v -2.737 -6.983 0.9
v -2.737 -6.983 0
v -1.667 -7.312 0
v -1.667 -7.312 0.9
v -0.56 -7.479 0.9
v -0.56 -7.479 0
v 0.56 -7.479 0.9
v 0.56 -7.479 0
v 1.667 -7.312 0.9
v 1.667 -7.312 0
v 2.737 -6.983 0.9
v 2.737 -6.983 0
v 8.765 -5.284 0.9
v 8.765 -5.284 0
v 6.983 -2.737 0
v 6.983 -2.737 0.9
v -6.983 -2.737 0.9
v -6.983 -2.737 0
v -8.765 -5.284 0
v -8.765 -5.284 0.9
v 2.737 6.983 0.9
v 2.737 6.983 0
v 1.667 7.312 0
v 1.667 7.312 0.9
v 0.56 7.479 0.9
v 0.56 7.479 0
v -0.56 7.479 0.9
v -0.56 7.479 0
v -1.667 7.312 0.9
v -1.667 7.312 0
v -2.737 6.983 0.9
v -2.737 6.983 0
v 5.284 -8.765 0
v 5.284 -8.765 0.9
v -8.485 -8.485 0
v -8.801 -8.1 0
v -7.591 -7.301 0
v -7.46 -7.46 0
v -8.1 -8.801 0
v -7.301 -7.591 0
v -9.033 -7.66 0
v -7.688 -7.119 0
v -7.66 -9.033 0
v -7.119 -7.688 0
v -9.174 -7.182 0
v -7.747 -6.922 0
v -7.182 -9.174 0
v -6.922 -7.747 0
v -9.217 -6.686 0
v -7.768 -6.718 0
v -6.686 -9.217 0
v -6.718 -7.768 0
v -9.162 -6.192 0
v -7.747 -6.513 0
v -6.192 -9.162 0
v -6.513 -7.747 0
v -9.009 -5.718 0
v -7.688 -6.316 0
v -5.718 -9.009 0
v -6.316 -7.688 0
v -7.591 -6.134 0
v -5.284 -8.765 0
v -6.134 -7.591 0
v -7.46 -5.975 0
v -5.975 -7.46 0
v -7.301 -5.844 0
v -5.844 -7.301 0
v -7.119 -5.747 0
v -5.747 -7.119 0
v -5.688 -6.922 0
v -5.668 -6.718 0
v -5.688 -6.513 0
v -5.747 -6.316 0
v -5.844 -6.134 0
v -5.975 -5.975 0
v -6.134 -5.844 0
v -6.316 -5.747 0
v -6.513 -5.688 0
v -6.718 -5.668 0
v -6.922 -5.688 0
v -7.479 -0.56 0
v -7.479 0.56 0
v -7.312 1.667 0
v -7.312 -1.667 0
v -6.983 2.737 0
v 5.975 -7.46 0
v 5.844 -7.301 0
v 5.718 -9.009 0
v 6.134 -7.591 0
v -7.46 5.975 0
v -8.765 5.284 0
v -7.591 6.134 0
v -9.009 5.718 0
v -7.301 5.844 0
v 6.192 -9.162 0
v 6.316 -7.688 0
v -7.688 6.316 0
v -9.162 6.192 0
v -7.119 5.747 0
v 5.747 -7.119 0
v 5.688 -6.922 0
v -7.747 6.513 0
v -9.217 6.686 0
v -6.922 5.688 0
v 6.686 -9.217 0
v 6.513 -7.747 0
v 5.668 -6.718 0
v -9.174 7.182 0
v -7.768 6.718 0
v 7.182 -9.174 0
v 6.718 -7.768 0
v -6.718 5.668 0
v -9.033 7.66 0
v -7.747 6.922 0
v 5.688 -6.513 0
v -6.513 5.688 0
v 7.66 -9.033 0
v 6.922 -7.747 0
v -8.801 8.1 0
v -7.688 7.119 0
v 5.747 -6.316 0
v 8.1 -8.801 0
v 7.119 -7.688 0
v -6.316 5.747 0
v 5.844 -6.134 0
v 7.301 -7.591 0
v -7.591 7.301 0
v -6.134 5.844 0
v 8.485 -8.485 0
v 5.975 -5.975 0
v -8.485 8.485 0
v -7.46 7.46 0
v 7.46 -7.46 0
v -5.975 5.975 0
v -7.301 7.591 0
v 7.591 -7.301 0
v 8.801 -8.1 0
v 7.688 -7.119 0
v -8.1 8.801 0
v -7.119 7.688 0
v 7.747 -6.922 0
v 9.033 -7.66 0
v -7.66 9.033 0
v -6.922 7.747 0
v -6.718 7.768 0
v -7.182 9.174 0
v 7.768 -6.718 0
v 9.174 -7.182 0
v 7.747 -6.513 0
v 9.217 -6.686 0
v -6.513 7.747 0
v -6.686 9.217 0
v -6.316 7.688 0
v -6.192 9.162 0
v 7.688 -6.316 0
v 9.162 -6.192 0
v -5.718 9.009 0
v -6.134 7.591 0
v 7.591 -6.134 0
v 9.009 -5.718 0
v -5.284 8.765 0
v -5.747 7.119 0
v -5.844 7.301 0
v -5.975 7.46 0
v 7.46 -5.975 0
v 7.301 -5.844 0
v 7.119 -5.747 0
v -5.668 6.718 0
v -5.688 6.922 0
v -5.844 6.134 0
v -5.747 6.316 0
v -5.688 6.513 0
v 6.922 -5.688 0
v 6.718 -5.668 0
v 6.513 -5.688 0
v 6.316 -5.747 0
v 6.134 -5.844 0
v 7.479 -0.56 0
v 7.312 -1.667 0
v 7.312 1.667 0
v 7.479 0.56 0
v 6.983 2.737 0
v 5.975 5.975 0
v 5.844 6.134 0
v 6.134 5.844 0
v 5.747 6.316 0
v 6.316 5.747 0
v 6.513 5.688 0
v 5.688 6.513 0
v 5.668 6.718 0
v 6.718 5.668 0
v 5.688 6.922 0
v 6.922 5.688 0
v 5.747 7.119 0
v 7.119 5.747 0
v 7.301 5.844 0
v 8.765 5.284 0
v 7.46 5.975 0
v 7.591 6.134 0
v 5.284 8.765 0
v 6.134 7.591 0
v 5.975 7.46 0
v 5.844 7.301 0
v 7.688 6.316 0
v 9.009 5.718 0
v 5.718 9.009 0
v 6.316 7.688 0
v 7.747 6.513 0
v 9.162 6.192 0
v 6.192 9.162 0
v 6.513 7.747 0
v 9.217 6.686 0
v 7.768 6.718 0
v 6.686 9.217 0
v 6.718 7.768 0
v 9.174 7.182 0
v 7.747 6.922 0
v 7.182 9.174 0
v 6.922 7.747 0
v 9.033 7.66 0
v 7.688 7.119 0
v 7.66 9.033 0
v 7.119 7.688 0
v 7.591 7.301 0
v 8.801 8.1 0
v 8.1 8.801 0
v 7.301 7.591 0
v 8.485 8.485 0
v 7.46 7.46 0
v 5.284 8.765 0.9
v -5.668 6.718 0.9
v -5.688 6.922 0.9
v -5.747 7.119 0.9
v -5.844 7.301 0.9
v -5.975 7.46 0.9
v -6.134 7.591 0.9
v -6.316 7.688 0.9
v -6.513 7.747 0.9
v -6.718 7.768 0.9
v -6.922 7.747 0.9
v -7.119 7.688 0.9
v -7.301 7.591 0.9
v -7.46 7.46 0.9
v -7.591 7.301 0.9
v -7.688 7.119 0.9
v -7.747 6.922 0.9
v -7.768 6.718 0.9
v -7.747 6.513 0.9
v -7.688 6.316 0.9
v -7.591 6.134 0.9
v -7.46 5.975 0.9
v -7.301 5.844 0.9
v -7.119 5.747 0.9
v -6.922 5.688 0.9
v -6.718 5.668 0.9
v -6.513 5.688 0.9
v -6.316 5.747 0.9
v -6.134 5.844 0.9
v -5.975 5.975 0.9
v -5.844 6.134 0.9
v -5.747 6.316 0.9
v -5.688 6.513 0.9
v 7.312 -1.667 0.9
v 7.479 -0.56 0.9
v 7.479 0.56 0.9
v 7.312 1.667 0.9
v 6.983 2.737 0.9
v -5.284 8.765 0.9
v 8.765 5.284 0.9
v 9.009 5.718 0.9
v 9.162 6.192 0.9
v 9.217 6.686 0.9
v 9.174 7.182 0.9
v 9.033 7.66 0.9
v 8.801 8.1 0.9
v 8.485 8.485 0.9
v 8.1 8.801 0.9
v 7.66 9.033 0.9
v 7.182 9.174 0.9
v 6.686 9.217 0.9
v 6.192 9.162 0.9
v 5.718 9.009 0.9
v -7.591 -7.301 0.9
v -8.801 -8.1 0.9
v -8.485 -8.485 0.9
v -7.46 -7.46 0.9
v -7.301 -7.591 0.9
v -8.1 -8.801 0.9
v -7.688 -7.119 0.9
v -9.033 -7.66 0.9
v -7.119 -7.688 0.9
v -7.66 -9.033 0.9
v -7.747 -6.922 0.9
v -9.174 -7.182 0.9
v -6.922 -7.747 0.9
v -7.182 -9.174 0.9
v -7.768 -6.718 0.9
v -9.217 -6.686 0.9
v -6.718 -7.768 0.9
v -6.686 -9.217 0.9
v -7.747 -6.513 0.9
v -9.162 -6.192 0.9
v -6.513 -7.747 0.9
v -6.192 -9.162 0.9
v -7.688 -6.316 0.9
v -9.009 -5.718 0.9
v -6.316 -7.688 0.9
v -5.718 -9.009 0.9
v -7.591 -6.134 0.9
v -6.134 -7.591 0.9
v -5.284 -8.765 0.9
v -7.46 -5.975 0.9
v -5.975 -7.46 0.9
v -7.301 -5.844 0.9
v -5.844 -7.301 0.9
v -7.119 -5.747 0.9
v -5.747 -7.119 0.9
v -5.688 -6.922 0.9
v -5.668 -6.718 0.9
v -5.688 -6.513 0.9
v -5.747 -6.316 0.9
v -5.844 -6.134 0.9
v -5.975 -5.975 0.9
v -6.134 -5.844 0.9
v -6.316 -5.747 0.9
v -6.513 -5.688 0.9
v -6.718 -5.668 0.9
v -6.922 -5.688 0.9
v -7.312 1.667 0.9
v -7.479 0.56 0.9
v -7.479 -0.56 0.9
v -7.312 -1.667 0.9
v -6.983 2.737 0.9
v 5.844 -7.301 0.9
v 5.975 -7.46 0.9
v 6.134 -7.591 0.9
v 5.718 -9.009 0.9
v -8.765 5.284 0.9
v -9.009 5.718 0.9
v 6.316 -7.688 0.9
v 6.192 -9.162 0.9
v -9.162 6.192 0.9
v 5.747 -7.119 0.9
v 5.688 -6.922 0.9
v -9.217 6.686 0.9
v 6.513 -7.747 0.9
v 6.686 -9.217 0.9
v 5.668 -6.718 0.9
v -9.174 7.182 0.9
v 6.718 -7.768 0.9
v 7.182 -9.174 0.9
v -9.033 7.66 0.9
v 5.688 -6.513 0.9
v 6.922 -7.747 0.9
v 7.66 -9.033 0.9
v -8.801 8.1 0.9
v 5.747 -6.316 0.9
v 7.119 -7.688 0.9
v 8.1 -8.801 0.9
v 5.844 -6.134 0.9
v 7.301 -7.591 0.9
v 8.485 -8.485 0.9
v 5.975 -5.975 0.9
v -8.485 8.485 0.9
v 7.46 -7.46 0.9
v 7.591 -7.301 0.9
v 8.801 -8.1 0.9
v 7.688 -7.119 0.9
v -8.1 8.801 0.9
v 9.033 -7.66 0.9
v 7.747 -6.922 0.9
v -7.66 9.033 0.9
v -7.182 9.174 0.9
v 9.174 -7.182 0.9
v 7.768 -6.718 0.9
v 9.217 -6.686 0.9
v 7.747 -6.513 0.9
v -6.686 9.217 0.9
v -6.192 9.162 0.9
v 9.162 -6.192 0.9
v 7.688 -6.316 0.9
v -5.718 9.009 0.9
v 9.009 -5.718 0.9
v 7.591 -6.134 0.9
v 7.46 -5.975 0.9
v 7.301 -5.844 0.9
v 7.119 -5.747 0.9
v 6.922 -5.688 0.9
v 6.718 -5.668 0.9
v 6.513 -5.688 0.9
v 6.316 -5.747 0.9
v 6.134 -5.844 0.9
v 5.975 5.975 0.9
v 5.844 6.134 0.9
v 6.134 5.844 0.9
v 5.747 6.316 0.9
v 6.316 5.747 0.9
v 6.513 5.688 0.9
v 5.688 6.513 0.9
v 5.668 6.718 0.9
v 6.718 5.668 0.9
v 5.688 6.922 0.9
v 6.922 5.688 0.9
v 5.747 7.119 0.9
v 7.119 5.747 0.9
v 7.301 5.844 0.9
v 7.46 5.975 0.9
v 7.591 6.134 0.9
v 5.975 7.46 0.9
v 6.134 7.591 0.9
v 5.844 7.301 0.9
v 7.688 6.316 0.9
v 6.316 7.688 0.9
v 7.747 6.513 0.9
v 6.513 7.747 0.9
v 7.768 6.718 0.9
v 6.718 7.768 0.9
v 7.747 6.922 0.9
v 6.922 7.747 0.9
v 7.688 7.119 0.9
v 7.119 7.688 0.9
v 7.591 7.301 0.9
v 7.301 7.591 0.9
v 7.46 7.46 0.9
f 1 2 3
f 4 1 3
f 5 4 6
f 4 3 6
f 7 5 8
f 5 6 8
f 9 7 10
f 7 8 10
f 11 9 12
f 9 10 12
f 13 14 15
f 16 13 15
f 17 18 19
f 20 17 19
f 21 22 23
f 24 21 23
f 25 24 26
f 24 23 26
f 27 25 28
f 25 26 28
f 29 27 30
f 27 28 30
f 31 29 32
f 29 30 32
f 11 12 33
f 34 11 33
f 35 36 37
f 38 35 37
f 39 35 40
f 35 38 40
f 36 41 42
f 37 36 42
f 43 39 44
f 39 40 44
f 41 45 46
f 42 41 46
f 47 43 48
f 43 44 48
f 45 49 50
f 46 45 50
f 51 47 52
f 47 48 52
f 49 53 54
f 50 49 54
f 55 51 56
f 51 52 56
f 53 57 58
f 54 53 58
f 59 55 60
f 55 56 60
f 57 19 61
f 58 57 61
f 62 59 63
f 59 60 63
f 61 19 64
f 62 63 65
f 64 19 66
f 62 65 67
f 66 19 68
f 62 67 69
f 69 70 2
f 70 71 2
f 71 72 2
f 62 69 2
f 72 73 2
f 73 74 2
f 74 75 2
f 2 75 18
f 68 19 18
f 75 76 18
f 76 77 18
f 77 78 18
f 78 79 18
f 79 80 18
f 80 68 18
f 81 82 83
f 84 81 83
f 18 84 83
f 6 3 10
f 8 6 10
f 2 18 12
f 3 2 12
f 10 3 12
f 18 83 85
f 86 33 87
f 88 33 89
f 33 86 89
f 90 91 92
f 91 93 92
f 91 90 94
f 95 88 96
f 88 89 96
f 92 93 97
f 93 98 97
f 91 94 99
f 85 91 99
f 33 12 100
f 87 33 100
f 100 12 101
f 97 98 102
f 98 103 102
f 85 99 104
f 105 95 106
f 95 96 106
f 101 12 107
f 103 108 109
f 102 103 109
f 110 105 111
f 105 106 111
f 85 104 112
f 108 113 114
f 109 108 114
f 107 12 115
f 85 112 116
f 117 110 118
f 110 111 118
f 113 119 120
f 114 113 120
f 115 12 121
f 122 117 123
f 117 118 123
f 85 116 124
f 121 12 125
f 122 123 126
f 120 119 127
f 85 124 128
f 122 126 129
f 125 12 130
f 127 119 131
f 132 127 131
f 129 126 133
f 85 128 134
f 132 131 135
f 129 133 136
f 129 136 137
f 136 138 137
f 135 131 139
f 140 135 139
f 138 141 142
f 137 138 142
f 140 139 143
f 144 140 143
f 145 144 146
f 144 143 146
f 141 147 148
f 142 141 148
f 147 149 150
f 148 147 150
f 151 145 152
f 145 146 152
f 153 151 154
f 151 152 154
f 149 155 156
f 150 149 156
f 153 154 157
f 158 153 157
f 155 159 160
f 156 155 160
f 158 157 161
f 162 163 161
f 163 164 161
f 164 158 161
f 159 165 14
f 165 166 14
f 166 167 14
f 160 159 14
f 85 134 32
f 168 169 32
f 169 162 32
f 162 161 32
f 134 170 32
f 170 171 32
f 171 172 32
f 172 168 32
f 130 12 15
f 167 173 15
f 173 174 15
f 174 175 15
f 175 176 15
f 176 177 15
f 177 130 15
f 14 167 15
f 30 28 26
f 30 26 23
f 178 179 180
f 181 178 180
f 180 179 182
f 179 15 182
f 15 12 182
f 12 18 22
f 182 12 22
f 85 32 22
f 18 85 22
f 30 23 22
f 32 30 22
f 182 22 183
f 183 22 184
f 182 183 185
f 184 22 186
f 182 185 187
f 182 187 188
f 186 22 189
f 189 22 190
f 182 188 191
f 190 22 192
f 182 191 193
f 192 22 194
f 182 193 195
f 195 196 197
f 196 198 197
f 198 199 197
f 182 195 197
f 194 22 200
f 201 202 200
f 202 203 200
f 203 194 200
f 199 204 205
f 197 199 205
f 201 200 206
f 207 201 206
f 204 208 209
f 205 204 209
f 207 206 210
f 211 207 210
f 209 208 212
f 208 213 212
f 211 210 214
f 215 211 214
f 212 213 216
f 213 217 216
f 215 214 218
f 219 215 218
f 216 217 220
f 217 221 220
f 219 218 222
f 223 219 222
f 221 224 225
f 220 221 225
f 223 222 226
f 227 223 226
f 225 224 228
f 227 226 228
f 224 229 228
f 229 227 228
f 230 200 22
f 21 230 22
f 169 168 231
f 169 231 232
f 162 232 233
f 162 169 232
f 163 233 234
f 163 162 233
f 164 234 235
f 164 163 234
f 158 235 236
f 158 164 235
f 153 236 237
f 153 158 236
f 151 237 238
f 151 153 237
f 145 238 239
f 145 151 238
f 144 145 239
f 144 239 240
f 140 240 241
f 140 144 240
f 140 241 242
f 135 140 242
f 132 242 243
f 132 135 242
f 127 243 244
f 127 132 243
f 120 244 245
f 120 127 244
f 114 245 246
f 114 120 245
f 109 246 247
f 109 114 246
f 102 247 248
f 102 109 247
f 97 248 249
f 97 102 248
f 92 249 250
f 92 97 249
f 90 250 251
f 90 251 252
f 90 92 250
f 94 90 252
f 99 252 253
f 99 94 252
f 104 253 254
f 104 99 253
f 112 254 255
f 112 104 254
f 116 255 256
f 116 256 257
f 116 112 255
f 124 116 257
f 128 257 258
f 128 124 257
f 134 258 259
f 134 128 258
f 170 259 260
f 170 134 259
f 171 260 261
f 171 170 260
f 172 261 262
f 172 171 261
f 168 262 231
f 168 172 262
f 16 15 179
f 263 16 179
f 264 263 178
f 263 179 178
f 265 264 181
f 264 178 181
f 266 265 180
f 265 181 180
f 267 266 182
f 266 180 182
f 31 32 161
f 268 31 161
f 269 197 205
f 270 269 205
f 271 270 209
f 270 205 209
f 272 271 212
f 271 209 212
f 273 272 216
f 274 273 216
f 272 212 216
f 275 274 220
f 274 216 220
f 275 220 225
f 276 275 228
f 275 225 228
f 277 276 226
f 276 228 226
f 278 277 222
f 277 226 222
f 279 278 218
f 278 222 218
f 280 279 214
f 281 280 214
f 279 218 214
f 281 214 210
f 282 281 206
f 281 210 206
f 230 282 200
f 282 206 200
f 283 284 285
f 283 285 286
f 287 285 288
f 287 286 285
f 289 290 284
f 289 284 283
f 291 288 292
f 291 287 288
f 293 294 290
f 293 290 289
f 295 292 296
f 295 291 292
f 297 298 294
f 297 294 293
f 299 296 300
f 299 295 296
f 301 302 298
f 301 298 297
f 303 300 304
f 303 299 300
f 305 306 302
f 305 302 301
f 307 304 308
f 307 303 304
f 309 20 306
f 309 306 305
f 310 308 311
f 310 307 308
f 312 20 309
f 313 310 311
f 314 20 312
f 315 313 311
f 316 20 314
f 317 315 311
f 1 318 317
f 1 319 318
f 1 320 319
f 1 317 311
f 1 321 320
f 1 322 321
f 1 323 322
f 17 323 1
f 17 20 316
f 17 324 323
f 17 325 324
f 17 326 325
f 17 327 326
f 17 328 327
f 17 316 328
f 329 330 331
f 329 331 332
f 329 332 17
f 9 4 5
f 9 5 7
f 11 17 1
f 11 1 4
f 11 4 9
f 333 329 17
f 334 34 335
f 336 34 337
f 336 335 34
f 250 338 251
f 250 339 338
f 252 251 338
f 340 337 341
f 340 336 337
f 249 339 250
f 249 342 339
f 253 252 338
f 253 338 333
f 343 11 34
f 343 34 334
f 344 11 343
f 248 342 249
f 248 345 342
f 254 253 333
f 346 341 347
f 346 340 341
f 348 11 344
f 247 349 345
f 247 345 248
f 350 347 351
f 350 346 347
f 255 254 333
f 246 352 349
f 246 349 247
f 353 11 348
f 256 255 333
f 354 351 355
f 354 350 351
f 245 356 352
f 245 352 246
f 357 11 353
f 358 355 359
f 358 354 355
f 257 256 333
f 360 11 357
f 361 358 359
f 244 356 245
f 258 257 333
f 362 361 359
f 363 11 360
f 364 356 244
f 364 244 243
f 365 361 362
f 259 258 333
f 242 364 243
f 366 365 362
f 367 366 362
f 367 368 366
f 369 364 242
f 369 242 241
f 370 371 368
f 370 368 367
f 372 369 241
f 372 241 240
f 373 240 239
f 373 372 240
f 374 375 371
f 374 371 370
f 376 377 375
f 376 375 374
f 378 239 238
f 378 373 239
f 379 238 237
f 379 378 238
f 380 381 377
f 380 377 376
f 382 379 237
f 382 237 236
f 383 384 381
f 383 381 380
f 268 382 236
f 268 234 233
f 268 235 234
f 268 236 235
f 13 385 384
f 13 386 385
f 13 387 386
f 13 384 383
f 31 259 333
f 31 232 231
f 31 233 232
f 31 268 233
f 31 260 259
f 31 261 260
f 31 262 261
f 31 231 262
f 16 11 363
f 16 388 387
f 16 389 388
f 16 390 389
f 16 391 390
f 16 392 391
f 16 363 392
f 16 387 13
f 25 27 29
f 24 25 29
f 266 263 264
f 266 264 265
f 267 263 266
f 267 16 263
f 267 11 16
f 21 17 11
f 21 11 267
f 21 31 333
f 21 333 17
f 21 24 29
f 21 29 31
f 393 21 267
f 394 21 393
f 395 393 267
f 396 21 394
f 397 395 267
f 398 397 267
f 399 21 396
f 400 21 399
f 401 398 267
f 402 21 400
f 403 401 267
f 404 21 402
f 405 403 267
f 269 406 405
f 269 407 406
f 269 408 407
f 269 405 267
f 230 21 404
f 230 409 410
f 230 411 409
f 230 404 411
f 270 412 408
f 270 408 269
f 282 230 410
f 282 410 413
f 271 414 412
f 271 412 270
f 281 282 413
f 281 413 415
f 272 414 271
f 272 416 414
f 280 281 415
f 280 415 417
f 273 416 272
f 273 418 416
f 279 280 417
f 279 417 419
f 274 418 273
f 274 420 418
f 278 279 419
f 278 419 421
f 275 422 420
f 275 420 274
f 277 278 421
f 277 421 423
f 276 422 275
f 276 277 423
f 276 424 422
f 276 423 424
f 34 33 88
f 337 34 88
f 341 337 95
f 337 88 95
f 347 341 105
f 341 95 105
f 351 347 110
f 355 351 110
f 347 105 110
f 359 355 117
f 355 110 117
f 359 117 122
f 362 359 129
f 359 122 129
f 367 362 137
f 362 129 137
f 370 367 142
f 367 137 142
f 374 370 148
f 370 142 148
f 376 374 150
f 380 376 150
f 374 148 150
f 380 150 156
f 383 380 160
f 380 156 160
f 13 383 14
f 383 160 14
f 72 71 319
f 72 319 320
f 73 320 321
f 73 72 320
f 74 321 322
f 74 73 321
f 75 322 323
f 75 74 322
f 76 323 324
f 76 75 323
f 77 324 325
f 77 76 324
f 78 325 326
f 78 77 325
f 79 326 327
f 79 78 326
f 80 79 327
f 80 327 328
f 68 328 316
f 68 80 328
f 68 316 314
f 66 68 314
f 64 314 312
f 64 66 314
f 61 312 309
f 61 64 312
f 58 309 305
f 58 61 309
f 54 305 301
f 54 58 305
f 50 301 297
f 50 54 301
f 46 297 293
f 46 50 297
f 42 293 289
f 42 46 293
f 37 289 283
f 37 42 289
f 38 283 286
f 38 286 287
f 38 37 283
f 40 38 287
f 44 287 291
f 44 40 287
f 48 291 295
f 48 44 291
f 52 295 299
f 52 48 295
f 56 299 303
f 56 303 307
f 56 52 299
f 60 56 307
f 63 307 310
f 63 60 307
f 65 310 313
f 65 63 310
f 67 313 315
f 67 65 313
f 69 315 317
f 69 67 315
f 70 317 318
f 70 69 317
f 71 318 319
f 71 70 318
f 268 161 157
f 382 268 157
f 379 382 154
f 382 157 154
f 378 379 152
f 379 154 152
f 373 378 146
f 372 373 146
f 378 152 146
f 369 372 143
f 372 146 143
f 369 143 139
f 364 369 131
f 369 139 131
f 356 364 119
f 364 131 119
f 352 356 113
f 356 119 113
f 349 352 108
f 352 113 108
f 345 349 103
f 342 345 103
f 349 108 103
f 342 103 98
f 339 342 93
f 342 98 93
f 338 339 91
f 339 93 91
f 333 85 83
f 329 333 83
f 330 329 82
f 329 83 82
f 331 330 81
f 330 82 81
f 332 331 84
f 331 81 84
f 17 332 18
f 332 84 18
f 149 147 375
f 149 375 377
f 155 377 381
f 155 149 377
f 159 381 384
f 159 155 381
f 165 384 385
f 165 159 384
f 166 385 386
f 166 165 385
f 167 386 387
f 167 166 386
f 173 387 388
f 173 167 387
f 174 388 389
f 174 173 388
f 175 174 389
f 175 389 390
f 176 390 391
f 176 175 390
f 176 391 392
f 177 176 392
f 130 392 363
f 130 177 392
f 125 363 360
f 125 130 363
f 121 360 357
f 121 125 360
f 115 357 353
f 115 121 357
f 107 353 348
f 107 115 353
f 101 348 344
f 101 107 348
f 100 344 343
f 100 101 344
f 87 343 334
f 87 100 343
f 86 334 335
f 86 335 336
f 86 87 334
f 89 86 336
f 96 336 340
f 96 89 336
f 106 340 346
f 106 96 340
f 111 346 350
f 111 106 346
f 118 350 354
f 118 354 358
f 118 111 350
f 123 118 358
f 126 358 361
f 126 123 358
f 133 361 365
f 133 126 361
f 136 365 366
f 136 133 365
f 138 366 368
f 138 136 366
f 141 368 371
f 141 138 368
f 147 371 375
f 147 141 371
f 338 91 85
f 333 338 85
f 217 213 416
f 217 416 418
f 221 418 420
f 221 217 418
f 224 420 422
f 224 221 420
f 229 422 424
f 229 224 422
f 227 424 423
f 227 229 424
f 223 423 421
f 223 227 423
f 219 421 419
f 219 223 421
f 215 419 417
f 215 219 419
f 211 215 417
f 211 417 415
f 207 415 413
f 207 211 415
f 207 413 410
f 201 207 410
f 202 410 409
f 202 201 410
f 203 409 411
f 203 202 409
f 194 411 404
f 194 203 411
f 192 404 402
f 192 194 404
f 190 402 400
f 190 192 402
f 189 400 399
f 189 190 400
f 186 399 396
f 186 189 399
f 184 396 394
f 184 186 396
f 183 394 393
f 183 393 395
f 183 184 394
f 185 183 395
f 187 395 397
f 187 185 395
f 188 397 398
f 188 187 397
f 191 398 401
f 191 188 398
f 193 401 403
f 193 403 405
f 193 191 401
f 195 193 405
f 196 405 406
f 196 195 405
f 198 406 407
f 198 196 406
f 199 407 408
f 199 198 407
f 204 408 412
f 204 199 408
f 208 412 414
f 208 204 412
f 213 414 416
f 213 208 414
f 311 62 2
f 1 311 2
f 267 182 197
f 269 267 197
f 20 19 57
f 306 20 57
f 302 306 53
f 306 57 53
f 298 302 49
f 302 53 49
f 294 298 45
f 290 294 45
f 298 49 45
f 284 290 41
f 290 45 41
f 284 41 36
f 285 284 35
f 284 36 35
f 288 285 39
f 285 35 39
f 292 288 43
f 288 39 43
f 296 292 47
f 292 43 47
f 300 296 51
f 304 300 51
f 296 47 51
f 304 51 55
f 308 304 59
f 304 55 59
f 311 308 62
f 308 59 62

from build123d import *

# Parameters (mm, degrees)
SKETCH_1_R      = 1.05
EXTRUDE_1_DEPTH = 0.9


with BuildPart() as part:
    # Эскиз1 → Бобышка-Вытянуть1 (new body)
    with BuildSketch(Plane.XY):
        with BuildLine():
            ThreePointArc((-6.982577353, 2.73744653), (-7.5, 0), (-6.982577353, -2.73744653))
            Line((-6.982577353, -2.73744653), (-8.765394532, -5.28357333))
            ThreePointArc((-8.765394532, -5.28357333), (-8.485281374, -8.485281374), (-5.28357333, -8.765394532))
            Line((-5.28357333, -8.765394532), (-2.73744653, -6.982577353))
            ThreePointArc((-2.73744653, -6.982577353), (0, -7.5), (2.73744653, -6.982577353))
            Line((2.73744653, -6.982577353), (5.28357333, -8.765394532))
            ThreePointArc((5.28357333, -8.765394532), (8.485281374, -8.485281374), (8.765394532, -5.28357333))
            Line((8.765394532, -5.28357333), (6.982577353, -2.73744653))
            ThreePointArc((6.982577353, -2.73744653), (7.5, 0), (6.982577353, 2.73744653))
            Line((6.982577353, 2.73744653), (8.765394532, 5.28357333))
            ThreePointArc((8.765394532, 5.28357333), (8.485281374, 8.485281374), (5.28357333, 8.765394532))
            Line((5.28357333, 8.765394532), (2.73744653, 6.982577353))
            ThreePointArc((2.73744653, 6.982577353), (0, 7.5), (-2.73744653, 6.982577353))
            Line((-2.73744653, 6.982577353), (-5.28357333, 8.765394532))
            ThreePointArc((-5.28357333, 8.765394532), (-8.485281374, 8.485281374), (-8.765394532, 5.28357333))
            Line((-8.765394532, 5.28357333), (-6.982577353, 2.73744653))
        make_face()
        with Locations((-6.717514421, -6.717514421)):
            Circle(SKETCH_1_R, mode=Mode.SUBTRACT)
        with Locations((6.717514421, -6.717514421)):
            Circle(SKETCH_1_R, mode=Mode.SUBTRACT)
        with Locations((-6.717514421, 6.717514421)):
            Circle(SKETCH_1_R, mode=Mode.SUBTRACT)
        with Locations((6.717514421, 6.717514421)):
            Circle(SKETCH_1_R, mode=Mode.SUBTRACT)
    extrude(amount=EXTRUDE_1_DEPTH)


solid = part.part
